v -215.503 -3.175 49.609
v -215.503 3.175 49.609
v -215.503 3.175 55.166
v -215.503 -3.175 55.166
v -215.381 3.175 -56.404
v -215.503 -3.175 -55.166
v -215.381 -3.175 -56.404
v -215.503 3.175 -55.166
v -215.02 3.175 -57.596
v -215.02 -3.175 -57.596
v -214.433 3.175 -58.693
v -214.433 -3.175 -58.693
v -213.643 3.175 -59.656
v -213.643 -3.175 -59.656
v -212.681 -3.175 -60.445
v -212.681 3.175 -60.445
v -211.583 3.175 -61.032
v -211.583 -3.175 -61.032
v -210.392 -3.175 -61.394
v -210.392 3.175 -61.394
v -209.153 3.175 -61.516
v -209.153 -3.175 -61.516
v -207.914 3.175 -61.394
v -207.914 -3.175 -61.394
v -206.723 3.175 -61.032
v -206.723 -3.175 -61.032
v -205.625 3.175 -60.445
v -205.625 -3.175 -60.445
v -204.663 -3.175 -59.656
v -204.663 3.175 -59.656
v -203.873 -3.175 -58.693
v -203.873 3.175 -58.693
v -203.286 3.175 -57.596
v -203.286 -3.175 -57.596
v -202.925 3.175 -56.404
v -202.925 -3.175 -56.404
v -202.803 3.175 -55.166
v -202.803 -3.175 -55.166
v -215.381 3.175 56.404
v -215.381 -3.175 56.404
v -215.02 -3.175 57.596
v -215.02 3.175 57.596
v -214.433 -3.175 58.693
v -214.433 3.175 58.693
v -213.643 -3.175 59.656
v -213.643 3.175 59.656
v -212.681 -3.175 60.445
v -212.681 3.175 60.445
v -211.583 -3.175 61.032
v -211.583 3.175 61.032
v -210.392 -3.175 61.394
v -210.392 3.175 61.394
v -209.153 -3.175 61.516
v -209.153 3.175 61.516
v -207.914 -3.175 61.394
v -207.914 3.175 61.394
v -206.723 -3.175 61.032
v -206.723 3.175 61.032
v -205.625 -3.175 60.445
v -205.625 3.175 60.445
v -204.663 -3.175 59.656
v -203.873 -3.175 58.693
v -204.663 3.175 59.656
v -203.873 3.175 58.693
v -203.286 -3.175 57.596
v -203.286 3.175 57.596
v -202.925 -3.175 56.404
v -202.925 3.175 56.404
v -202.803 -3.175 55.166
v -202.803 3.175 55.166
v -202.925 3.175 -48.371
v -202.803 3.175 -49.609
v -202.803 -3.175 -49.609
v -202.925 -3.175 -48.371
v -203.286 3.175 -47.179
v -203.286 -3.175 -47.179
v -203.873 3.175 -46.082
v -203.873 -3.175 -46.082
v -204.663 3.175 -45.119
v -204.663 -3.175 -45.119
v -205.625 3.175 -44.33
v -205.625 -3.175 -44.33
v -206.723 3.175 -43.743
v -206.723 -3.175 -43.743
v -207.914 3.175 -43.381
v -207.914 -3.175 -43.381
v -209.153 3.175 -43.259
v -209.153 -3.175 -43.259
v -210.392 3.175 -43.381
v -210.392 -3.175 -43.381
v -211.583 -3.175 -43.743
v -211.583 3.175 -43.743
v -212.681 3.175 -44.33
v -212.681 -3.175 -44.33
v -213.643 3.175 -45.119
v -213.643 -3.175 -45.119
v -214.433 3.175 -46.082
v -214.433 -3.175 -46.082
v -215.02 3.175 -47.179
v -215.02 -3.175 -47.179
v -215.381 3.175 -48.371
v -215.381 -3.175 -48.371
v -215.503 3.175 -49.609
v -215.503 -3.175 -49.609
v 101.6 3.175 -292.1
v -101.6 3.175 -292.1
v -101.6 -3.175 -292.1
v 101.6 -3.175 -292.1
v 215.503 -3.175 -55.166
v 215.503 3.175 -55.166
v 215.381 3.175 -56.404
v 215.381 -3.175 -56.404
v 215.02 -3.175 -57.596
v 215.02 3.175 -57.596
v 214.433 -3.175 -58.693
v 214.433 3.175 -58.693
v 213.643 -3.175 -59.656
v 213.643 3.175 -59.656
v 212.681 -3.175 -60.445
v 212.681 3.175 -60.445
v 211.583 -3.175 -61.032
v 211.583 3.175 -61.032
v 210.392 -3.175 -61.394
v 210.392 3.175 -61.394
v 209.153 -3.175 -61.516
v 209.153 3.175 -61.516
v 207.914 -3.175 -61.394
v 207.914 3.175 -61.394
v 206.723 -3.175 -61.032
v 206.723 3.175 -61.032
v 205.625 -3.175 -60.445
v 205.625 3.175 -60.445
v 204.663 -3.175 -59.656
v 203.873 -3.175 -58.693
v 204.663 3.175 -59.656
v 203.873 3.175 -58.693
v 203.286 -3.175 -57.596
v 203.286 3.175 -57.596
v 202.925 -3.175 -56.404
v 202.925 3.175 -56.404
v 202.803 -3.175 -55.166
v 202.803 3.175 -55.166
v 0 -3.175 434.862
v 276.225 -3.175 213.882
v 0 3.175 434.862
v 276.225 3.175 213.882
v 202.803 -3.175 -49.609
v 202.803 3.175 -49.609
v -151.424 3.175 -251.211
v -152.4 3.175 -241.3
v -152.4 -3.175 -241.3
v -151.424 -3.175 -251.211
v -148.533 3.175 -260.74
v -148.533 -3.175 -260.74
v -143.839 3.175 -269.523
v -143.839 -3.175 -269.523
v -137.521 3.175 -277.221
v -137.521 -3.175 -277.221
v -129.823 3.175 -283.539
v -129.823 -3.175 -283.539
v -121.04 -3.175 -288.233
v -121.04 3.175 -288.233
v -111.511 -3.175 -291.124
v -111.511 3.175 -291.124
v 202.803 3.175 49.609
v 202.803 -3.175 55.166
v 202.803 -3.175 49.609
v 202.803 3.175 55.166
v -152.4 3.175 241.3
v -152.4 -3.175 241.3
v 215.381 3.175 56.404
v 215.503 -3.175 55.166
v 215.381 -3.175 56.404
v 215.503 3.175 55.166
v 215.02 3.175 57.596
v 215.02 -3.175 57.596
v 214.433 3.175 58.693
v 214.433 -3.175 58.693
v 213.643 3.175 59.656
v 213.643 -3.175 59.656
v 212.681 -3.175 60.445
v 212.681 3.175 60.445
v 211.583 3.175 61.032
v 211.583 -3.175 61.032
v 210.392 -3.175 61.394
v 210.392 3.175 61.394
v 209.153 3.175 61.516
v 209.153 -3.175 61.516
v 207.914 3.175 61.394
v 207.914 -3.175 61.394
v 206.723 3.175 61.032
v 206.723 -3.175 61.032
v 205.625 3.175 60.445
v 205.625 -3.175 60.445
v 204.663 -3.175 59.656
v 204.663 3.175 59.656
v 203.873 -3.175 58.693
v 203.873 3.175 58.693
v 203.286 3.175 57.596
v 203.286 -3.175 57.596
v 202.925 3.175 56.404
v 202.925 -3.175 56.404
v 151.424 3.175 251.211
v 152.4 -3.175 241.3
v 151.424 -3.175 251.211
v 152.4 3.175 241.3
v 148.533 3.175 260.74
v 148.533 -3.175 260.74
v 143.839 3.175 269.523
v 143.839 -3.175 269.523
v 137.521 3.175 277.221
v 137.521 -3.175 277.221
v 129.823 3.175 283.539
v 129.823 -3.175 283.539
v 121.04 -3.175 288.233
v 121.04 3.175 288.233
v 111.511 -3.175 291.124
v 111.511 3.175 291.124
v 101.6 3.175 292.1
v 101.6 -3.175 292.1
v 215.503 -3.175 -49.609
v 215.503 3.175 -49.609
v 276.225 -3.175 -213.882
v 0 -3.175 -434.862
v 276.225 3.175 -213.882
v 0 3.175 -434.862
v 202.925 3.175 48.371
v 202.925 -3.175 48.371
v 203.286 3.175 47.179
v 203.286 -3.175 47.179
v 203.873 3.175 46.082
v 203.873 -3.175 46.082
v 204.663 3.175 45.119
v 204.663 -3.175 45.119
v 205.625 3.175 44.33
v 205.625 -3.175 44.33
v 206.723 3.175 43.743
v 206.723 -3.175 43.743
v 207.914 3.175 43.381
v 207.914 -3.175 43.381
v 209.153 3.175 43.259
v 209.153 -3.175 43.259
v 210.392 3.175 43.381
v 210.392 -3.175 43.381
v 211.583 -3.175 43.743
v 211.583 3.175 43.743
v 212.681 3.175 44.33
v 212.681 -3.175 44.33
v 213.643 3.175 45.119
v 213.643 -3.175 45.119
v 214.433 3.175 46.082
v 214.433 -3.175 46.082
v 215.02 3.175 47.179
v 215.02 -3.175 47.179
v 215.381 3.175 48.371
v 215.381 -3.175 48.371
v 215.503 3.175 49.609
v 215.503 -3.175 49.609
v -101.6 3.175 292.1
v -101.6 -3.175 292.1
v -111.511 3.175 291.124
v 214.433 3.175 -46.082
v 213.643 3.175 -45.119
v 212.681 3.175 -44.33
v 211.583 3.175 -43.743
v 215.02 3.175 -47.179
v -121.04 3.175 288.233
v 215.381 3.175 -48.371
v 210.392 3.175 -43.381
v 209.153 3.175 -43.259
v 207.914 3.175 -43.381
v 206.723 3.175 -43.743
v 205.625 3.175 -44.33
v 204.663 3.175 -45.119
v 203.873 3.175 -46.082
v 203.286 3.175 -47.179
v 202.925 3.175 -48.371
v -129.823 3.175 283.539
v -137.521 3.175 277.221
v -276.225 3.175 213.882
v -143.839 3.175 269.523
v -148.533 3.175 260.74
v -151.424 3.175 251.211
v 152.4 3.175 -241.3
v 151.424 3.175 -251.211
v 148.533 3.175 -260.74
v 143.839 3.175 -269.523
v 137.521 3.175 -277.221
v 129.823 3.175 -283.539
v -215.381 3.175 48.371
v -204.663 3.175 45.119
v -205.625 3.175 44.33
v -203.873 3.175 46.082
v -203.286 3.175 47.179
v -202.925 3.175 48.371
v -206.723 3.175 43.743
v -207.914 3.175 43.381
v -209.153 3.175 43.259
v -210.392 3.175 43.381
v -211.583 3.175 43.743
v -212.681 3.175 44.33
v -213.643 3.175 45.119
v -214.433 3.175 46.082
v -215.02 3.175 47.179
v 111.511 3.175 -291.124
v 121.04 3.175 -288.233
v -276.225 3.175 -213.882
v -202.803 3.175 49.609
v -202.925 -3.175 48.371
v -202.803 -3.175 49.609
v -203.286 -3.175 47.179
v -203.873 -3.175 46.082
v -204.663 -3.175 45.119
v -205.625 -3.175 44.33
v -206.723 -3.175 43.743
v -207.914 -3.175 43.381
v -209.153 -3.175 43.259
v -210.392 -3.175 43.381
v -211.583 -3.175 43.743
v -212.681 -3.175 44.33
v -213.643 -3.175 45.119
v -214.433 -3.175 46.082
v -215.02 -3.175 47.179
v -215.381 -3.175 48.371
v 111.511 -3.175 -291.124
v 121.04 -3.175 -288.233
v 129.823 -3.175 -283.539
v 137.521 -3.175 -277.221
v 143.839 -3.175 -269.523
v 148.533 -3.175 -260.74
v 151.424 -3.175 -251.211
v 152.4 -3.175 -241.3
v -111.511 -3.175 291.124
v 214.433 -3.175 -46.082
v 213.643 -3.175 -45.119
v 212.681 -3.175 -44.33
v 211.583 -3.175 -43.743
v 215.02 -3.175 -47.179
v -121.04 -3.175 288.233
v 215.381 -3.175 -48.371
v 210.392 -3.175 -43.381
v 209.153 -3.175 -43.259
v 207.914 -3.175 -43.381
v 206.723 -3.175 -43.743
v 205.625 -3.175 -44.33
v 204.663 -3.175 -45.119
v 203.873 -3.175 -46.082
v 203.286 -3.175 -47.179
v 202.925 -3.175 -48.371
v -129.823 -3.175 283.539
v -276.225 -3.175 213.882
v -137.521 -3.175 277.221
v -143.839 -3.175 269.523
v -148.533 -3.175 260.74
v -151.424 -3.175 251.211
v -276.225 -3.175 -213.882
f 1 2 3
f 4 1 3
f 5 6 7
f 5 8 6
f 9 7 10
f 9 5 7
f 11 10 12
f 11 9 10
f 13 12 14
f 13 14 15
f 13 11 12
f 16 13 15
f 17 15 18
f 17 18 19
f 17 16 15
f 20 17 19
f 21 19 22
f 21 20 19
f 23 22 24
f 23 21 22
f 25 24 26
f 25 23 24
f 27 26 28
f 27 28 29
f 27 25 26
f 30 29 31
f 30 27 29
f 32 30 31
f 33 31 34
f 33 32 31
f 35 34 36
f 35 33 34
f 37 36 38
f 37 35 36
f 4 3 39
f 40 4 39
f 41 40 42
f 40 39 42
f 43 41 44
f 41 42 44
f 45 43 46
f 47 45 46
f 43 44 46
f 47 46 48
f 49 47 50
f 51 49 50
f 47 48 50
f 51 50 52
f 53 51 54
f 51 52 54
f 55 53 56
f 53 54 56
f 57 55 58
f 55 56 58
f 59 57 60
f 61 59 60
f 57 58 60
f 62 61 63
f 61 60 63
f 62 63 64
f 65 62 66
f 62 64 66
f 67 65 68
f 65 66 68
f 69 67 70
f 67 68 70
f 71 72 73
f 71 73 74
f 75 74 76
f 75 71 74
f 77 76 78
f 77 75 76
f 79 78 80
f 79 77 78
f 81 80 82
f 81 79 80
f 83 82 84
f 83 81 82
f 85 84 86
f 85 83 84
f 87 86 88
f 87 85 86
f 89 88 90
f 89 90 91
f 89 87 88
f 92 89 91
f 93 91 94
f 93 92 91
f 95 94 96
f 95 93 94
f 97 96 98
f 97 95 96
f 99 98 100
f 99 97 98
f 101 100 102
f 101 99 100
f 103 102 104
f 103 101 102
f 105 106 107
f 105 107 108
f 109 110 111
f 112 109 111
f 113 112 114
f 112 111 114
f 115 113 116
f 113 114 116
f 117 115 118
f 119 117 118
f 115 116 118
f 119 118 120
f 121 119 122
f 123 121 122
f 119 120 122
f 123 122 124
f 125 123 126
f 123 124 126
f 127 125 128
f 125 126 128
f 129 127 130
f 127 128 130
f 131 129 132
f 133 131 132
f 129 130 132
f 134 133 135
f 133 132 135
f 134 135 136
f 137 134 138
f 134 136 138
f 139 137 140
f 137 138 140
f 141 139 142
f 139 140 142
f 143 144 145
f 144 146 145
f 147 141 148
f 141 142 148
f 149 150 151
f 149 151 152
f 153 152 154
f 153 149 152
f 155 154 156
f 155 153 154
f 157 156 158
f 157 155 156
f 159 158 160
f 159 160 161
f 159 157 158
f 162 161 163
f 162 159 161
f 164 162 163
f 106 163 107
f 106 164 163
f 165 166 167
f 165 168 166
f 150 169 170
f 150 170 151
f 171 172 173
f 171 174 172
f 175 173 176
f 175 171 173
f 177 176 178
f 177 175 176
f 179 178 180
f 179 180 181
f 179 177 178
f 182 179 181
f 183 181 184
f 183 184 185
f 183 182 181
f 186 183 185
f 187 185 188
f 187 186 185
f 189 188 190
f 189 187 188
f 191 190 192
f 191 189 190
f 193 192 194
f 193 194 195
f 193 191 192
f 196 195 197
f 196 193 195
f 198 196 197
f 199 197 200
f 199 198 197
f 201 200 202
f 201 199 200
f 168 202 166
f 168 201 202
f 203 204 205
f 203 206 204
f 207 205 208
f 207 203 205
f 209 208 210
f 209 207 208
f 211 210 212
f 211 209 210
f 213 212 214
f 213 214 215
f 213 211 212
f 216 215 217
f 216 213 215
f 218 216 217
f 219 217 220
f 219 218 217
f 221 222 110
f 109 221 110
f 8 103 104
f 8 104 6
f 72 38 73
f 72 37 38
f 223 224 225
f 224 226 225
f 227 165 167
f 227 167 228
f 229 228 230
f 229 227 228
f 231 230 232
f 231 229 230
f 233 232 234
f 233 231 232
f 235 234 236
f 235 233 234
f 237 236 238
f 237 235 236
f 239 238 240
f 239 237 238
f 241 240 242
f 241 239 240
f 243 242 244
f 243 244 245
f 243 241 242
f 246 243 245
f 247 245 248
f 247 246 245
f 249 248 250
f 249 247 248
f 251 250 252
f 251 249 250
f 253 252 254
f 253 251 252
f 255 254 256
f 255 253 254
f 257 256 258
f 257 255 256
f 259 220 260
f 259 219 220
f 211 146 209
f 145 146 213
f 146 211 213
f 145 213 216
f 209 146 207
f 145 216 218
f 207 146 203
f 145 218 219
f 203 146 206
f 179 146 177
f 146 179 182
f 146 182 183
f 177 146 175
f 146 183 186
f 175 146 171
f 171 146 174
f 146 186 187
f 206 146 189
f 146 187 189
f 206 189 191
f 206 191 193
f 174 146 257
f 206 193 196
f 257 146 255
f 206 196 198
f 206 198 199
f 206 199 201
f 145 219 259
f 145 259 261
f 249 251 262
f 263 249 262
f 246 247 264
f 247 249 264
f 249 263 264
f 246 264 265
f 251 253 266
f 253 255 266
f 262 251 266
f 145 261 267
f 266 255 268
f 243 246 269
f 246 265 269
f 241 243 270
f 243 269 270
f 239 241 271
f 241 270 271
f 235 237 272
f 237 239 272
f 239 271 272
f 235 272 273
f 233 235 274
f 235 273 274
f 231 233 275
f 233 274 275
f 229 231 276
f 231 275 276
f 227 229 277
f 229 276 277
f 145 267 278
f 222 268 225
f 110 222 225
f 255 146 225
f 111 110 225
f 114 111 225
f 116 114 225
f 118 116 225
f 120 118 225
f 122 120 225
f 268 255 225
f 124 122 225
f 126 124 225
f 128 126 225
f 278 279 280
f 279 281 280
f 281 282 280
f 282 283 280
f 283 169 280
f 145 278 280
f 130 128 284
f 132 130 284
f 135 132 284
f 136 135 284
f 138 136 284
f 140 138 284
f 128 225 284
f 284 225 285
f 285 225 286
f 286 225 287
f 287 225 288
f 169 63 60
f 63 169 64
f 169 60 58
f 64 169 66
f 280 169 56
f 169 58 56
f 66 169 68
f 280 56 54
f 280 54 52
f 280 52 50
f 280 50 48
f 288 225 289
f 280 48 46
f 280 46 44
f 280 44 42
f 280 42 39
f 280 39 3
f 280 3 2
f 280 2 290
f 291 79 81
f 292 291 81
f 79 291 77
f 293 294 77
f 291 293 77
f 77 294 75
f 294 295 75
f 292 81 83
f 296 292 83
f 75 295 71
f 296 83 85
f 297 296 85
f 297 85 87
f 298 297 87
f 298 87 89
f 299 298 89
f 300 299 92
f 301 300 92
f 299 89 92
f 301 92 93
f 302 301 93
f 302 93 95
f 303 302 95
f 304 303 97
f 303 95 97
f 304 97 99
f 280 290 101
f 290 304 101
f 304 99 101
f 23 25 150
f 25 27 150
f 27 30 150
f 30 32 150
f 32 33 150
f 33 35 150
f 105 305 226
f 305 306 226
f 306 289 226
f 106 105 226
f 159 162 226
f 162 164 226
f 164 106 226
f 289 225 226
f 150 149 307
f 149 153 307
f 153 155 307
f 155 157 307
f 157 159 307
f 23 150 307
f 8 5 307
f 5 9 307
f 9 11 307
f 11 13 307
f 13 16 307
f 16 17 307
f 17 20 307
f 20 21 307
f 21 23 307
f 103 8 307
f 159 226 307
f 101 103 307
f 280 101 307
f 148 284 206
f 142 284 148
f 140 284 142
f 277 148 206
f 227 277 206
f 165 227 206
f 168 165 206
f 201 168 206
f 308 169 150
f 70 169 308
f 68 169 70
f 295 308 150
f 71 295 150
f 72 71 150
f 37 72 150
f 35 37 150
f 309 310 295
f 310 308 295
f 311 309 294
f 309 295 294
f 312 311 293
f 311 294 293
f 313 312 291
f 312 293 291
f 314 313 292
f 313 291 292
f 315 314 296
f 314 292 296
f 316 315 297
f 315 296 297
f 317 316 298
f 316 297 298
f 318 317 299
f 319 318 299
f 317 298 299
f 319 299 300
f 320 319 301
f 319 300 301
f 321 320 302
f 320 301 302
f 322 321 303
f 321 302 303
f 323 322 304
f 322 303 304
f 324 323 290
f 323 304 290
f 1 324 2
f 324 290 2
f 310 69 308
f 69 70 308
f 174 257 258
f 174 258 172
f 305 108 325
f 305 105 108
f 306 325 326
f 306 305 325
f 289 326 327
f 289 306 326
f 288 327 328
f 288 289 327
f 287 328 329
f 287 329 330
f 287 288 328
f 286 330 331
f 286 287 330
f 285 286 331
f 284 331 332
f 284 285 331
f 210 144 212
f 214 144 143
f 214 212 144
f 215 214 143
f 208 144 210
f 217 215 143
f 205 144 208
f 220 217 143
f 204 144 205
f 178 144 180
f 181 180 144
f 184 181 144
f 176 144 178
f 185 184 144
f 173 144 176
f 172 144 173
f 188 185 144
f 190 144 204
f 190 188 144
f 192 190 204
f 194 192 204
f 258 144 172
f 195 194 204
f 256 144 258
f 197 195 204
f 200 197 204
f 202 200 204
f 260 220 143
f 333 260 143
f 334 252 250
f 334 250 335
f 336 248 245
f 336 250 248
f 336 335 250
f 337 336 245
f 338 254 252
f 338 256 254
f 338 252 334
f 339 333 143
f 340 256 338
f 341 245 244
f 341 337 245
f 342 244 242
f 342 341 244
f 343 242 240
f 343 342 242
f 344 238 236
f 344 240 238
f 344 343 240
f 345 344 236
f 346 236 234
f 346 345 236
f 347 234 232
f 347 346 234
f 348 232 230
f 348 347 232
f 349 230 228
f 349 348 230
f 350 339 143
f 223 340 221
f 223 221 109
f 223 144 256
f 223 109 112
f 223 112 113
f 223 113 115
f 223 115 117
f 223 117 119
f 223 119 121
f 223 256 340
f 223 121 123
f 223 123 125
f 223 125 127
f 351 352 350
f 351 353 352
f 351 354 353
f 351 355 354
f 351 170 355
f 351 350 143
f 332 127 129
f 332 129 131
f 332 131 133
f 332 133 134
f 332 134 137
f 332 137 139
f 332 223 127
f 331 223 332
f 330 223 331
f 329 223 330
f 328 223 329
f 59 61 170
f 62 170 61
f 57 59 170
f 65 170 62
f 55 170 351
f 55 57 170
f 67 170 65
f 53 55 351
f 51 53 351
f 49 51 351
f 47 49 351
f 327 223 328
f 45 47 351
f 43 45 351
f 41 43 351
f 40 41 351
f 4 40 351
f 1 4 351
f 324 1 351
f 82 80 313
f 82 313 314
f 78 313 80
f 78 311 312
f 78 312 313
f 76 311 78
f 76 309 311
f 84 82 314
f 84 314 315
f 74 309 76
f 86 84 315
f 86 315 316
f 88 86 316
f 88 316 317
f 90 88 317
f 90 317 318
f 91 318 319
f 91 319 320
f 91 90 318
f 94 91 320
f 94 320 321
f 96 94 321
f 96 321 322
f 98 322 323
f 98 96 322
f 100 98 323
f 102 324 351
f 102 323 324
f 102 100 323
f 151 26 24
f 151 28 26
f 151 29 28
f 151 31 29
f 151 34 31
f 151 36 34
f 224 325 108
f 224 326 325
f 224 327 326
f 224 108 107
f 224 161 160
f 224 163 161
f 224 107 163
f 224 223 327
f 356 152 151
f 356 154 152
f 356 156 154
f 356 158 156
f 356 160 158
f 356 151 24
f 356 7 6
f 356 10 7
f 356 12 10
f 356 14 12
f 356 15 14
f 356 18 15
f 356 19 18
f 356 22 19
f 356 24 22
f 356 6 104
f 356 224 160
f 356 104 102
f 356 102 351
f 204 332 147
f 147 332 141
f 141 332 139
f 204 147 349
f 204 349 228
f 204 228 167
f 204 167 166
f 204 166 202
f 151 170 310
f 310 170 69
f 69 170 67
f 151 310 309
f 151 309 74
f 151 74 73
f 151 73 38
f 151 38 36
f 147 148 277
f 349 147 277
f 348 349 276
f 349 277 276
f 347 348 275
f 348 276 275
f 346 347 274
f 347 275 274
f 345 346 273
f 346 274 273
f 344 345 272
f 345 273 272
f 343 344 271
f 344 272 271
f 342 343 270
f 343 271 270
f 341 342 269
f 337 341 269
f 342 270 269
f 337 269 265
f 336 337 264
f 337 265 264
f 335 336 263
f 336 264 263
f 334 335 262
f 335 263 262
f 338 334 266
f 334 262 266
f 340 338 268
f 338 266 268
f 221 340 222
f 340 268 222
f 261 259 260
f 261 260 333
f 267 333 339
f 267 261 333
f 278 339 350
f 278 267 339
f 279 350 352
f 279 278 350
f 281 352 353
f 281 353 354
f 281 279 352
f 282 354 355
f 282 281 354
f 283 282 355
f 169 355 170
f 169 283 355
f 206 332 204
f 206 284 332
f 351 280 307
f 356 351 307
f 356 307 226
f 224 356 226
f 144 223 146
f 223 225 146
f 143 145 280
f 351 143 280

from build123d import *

# Parameters (mm, degrees)
BOSS_EXTRUDE1_DEPTH = 3.175


with BuildPart() as part:
    # Sketch1 → Boss-Extrude1 (new body, symmetric)
    with BuildSketch(Plane(origin=(0, 0, 0), x_dir=(1, 0, 0), z_dir=(0, 1, 0))):
        Polygon((-276.225, 213.881843), (0, 434.861843), (276.225, 213.881843), (276.225, -213.881843), (0, -434.861843), (-276.225, -213.881843), align=None)
        with BuildLine():
            Line((101.6, -292.1), (-101.6, -292.1))
            ThreePointArc((-101.6, -292.1), (-137.521024484, -277.221024484), (-152.4, -241.3))
            Line((-152.4, -241.3), (-152.4, 241.3))
            ThreePointArc((-152.4, 241.3), (-137.521024484, 277.221024484), (-101.6, 292.1))
            Line((-101.6, 292.1), (101.6, 292.1))
            ThreePointArc((101.6, 292.1), (137.521024484, 277.221024484), (152.4, 241.3))
            Line((152.4, 241.3), (152.4, -241.3))
            ThreePointArc((152.4, -241.3), (137.521024484, -277.221024484), (101.6, -292.1))
        make_face(mode=Mode.SUBTRACT)
        with BuildLine():
            Line((-202.803125, 55.165625), (-202.803125, 49.609375))
            ThreePointArc((-202.803125, 49.609375), (-209.153125, 43.259375), (-215.503125, 49.609375))
            Line((-215.503125, 49.609375), (-215.503125, 55.165625))
            ThreePointArc((-215.503125, 55.165625), (-209.153125, 61.515625), (-202.803125, 55.165625))
        make_face(mode=Mode.SUBTRACT)
        with BuildLine():
            Line((-202.803125, -55.165625), (-202.803125, -49.609375))
            ThreePointArc((-202.803125, -49.609375), (-209.153125, -43.259375), (-215.503125, -49.609375))
            Line((-215.503125, -49.609375), (-215.503125, -55.165625))
            ThreePointArc((-215.503125, -55.165625), (-209.153125, -61.515625), (-202.803125, -55.165625))
        make_face(mode=Mode.SUBTRACT)
        with BuildLine():
            Line((202.803125, -55.165625), (202.803125, -49.609375))
            ThreePointArc((202.803125, -49.609375), (209.153125, -43.259375), (215.503125, -49.609375))
            Line((215.503125, -49.609375), (215.503125, -55.165625))
            ThreePointArc((215.503125, -55.165625), (209.153125, -61.515625), (202.803125, -55.165625))
        make_face(mode=Mode.SUBTRACT)
        with BuildLine():
            Line((202.803125, 55.165625), (202.803125, 49.609375))
            ThreePointArc((202.803125, 49.609375), (209.153125, 43.259375), (215.503125, 49.609375))
            Line((215.503125, 49.609375), (215.503125, 55.165625))
            ThreePointArc((215.503125, 55.165625), (209.153125, 61.515625), (202.803125, 55.165625))
        make_face(mode=Mode.SUBTRACT)
    extrude(amount=BOSS_EXTRUDE1_DEPTH, both=True)


solid = part.part
